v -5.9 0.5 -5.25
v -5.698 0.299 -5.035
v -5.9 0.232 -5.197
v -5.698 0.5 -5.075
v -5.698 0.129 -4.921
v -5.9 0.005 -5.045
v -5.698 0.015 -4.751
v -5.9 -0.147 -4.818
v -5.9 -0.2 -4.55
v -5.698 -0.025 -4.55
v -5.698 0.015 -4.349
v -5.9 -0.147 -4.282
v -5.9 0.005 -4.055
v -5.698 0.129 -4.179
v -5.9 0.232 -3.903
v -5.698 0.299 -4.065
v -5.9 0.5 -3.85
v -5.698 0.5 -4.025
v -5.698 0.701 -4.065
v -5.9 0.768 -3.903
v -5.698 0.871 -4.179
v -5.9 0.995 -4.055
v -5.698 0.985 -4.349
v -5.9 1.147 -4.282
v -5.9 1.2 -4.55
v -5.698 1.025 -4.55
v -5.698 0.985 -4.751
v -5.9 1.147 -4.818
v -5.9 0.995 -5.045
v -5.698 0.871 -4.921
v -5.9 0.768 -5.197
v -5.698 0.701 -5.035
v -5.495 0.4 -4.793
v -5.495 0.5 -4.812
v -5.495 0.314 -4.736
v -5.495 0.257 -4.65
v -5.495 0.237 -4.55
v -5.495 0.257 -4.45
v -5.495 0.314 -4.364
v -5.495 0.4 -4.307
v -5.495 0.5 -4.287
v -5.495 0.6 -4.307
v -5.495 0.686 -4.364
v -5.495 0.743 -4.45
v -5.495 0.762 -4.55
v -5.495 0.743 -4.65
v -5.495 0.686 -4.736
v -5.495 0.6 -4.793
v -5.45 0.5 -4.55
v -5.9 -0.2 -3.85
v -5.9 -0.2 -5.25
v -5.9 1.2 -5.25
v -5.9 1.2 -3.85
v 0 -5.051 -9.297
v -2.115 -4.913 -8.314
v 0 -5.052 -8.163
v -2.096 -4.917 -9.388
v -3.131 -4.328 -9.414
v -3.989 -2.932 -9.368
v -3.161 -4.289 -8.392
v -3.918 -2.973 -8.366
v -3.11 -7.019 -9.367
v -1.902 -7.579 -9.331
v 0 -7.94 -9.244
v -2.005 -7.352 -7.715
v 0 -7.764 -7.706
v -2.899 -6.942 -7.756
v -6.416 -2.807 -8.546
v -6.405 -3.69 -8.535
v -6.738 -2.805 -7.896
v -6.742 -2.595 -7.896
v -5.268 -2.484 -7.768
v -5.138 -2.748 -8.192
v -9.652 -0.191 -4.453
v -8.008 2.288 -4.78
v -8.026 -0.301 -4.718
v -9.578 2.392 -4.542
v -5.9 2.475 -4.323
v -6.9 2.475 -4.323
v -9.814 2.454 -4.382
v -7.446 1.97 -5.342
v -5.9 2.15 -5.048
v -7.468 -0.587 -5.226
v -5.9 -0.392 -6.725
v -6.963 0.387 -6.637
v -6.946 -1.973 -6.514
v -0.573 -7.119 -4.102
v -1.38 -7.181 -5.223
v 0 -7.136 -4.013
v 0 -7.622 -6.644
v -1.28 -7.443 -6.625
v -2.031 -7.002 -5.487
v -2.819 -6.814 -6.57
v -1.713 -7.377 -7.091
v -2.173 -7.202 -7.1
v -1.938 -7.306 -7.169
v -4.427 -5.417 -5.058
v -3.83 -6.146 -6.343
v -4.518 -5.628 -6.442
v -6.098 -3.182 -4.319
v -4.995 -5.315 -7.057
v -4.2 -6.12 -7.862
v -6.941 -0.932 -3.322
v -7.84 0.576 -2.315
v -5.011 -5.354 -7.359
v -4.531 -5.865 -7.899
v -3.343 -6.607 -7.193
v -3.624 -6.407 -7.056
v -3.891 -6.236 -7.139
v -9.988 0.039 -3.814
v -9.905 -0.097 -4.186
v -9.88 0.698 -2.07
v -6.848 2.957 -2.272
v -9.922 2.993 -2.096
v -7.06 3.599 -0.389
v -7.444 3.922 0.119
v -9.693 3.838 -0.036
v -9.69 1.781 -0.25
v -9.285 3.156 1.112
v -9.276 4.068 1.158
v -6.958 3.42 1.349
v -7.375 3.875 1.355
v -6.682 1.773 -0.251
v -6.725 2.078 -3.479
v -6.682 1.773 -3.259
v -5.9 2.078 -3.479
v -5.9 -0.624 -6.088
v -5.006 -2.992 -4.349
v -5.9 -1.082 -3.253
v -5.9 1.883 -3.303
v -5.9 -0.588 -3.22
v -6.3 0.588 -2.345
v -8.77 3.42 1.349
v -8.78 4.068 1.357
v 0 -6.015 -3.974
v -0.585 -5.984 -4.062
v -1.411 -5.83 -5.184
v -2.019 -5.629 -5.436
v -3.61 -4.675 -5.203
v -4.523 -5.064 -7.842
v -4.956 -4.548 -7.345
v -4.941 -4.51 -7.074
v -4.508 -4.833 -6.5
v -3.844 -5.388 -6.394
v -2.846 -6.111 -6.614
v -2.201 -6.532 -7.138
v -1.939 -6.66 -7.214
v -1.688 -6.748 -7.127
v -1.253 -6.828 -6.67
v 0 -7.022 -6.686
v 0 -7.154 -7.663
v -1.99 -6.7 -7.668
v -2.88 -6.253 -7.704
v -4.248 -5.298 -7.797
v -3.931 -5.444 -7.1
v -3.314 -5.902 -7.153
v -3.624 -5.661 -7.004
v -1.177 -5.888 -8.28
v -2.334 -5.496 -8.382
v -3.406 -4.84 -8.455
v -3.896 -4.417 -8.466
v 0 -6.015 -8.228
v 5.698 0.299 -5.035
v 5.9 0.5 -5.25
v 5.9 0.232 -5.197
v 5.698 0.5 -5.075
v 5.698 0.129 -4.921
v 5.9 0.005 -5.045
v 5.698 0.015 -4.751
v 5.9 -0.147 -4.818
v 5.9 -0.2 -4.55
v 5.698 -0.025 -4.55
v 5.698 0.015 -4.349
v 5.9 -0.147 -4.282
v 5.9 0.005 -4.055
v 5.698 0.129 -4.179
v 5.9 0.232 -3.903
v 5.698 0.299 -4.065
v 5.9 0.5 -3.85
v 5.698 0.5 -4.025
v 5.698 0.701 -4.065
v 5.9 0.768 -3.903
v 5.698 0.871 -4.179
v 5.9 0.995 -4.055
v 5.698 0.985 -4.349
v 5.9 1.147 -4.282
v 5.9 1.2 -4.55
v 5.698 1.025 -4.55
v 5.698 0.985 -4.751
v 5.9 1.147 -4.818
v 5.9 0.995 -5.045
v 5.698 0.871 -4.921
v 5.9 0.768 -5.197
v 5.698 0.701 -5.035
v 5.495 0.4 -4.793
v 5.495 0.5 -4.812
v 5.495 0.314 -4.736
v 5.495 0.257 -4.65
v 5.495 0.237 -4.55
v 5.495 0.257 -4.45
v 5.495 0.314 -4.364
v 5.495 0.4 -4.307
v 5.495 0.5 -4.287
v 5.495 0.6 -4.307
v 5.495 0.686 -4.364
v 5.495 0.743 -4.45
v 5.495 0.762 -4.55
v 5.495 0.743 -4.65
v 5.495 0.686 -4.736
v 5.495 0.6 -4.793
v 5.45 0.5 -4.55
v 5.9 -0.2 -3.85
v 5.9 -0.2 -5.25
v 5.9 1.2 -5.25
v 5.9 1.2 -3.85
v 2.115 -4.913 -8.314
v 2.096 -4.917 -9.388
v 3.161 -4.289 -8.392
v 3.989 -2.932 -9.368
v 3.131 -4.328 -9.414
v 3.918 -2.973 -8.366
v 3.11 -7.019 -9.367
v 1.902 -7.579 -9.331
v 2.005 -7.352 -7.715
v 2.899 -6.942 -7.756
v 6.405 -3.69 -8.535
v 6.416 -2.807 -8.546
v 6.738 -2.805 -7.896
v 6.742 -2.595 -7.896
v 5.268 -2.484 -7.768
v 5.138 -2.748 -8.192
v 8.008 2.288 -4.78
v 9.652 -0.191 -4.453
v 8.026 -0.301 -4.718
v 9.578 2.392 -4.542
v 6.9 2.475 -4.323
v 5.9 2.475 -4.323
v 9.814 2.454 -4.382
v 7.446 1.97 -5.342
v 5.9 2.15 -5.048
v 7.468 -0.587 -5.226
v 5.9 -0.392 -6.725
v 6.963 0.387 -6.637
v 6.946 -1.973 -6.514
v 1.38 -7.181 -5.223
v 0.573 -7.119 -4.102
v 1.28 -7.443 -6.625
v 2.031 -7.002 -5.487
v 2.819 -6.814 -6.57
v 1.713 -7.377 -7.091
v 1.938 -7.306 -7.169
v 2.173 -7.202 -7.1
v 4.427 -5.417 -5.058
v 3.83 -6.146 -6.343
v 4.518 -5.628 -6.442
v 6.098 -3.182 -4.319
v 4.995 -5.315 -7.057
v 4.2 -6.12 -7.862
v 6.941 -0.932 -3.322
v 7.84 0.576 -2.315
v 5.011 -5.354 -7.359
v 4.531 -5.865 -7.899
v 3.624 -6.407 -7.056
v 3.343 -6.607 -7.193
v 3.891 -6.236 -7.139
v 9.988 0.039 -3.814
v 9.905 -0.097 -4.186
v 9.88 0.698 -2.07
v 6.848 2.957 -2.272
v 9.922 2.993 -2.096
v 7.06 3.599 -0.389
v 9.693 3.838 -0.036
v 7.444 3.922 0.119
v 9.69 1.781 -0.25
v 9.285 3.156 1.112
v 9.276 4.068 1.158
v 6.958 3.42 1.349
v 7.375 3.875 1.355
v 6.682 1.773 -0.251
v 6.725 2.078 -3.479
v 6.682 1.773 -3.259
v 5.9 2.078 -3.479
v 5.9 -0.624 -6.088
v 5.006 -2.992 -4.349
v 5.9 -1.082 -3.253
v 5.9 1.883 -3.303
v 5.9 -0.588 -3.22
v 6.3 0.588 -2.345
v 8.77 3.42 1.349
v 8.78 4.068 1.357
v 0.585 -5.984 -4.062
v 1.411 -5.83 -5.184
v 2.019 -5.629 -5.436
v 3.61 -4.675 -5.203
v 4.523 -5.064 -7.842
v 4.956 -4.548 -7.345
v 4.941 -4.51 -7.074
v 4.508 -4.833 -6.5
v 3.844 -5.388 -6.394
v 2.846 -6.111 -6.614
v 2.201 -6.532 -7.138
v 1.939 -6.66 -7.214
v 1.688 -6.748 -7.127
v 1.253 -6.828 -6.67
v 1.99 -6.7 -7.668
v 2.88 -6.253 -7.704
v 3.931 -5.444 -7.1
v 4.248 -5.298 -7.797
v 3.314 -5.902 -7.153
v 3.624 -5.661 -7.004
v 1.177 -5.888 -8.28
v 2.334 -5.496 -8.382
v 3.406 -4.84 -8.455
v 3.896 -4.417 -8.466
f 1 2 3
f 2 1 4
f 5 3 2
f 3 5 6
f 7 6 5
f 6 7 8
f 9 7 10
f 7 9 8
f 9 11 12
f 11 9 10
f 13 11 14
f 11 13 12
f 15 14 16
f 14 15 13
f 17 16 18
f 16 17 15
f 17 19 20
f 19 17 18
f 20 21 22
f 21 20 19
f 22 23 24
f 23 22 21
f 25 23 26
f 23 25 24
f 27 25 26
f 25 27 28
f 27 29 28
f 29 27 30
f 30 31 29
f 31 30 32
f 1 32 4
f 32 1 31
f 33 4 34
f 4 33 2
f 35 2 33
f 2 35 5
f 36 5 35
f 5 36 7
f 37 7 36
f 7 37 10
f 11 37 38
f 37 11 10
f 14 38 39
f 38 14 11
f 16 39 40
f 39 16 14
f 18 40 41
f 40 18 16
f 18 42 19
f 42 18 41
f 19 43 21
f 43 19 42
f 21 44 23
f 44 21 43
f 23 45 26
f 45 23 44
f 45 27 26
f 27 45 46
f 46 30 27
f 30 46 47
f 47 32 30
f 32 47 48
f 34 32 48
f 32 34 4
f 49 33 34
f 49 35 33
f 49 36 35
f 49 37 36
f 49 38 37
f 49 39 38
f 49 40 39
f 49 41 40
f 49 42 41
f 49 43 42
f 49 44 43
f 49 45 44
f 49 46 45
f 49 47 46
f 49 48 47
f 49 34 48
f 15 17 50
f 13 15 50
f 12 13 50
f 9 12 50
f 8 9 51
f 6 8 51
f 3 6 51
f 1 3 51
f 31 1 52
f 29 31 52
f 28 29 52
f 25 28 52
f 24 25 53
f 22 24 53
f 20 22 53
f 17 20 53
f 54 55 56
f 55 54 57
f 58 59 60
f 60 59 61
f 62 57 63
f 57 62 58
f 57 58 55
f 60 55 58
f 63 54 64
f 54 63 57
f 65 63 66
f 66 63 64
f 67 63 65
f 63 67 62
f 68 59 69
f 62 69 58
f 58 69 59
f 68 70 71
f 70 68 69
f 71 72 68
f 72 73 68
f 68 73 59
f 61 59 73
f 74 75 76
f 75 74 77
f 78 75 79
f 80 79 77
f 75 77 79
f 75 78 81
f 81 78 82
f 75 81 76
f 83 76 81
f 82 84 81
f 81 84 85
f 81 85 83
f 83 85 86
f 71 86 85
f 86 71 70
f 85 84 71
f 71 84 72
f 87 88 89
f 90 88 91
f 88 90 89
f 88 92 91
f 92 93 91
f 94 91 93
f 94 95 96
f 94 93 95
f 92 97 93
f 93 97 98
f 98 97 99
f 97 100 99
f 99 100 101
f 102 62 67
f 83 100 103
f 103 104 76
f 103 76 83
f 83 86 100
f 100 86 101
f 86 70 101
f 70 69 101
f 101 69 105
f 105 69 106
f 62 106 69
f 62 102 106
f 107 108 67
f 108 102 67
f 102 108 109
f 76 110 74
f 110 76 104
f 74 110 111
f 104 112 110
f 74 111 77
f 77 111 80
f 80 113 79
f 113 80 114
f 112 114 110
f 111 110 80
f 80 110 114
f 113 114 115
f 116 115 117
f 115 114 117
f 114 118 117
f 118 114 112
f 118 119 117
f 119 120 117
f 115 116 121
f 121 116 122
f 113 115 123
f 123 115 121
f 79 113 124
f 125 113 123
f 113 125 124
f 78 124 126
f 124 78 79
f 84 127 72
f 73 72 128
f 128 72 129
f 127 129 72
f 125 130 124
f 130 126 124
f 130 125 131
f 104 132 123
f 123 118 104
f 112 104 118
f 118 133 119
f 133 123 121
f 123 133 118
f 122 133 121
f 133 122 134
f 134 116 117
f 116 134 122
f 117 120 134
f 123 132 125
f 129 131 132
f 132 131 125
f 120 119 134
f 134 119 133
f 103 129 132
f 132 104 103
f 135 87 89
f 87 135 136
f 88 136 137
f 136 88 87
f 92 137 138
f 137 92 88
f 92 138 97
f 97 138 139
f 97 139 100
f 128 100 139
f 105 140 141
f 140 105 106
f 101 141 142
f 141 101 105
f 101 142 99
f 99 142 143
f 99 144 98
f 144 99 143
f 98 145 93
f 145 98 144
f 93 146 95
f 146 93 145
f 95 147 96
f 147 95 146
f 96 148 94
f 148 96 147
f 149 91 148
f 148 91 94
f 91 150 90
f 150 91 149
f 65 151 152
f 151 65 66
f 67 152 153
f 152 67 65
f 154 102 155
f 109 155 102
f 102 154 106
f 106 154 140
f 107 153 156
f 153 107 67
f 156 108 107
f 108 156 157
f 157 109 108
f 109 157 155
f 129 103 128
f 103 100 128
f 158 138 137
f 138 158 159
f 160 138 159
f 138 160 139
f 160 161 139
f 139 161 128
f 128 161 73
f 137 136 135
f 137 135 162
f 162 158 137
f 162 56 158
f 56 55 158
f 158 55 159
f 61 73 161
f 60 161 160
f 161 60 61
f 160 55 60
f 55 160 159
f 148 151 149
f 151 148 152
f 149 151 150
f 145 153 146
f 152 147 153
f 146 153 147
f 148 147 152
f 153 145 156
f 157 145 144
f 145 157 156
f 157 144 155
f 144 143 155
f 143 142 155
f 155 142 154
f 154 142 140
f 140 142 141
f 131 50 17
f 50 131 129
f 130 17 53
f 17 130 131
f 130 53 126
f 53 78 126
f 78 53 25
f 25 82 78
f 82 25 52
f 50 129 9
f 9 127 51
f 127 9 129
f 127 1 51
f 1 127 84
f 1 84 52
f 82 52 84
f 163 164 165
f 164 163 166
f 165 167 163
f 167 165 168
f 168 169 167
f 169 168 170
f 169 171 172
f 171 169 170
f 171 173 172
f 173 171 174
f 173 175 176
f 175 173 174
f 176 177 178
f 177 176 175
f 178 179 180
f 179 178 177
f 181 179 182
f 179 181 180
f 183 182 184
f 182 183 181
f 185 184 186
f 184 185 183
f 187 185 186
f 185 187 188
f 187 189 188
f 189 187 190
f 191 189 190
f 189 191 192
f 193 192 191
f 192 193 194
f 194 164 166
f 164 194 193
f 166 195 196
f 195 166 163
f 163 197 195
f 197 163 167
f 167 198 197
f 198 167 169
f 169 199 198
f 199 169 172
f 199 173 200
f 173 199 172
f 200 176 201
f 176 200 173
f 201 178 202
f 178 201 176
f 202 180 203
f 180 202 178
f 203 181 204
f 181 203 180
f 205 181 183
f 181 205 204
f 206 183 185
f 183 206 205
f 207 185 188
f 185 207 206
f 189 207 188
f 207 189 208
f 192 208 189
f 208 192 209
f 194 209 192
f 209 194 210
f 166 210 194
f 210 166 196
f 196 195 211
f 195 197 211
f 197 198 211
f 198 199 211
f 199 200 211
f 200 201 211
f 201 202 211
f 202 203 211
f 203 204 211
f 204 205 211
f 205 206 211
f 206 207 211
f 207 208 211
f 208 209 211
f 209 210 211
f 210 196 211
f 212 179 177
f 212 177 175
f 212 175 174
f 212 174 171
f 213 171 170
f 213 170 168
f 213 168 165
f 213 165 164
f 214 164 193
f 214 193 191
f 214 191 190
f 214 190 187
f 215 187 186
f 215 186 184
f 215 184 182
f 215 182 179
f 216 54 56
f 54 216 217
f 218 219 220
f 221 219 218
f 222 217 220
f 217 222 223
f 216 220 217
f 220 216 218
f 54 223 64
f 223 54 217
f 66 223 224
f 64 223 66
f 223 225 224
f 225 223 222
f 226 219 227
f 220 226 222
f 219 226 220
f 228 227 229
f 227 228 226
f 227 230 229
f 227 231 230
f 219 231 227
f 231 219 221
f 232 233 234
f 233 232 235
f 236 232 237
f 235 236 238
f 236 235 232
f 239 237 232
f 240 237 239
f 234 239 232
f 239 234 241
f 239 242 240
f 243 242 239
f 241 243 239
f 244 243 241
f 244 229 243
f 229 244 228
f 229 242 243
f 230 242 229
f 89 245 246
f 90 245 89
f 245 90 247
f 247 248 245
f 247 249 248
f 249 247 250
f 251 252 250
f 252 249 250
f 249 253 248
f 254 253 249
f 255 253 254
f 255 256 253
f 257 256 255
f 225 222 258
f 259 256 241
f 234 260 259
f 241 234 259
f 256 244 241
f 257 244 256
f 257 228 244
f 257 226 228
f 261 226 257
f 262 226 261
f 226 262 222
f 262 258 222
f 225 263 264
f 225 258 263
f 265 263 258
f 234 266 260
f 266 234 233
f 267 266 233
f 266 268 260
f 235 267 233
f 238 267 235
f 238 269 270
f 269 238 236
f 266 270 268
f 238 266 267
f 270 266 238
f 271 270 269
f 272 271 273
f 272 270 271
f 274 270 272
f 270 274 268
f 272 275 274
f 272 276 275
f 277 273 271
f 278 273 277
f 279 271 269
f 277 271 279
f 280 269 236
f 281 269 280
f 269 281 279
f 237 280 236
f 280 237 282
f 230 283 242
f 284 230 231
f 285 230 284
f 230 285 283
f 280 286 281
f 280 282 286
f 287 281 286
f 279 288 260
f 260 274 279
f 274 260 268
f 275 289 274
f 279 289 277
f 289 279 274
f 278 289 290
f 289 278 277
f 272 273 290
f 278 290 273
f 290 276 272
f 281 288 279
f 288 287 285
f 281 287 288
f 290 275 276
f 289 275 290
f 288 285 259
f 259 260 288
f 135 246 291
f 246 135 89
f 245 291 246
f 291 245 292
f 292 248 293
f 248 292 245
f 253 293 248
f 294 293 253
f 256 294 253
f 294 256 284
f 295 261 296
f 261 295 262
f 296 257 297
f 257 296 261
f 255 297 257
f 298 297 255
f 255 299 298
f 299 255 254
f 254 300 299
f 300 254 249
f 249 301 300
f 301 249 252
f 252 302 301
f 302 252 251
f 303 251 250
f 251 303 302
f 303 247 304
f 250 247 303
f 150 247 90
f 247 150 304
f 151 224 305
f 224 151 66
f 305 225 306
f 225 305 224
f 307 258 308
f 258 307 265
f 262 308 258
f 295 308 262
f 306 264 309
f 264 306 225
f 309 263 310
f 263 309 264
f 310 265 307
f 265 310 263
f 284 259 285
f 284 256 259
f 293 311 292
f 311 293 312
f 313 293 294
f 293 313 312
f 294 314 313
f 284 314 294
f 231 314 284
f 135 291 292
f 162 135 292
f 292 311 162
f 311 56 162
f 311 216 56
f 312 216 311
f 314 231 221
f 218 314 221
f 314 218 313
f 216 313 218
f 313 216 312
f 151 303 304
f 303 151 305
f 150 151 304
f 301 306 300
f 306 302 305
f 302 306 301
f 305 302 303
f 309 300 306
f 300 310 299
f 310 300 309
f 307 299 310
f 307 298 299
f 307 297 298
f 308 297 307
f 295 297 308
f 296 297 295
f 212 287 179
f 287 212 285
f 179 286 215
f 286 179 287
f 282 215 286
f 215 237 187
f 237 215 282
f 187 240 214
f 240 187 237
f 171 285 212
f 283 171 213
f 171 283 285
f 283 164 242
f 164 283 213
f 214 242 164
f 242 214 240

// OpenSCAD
use <../lib.scad>
use <s/98129s01.scad>
function ldraw_lib__98129() = [
// 0 Minifig Helmet Visor Samurai
// 0 Name: 98129.dat
// 0 Author: Evert-Jan Boer [ejboer]
// 0 !LDRAW_ORG Part UPDATE 2026-02
// 0 !LICENSE Licensed under CC BY 4.0 : see CAreadme.txt
// 
// 0 BFC CERTIFY CCW
  [0,"BFC","CERTIFY"],
  [0,"BFC","CCW"],
// 
// 0 !KEYWORDS Brickowl 341414
// 
// 0 !HISTORY 2013-08-14 {LEGO Digital Designer} Original part shape
// 0 !HISTORY 2024-01-21 [ejboer] File preparation for LDraw Parts Tracker
// 0 !HISTORY 2026-03-06 [OrionP] Official Update 2026-02
// 
// 1 16 0 0 0 1 0 0 0 1 0 0 0 1 s\98129s01.dat
  [1,16,0,0,0,1,0,0,0,1,0,0,0,1, ldraw_lib__s__98129s01()],
// 1 16 0 0 0 -1 0 0 0 1 0 0 0 1 s\98129s01.dat
  [1,16,0,0,0,-1,0,0,0,1,0,0,0,1, ldraw_lib__s__98129s01()],
// 
// 5 24 0 20.571 -15.038 0 20.407 -12.631 -2.943 20.7 -14.721 2.943 20.7 -14.721
  [5,24,0,20.571,-15.038,0,20.407,-12.631,-2.943,20.7,-14.721,2.943,20.7,-14.721],
// 5 24 0 9.934 -15.038 0 20.571 -15.038 3.527 12.959 -14.576 -3.527 12.959 -14.576
  [5,24,0,9.934,-15.038,0,20.571,-15.038,3.527,12.959,-14.576,-3.527,12.959,-14.576],
// 5 24 0 20.407 -12.631 0 23.242 -12.627 5.241 23.469 -12.293 -5.241 23.469 -12.293
  [5,24,0,20.407,-12.631,0,23.242,-12.627,5.241,23.469,-12.293,-5.241,23.469,-12.293],
// 5 24 0 19.158 -17.886 0 16.715 -17.555 -3.133 16.675 -17.069 3.133 16.675 -17.069
  [5,24,0,19.158,-17.886,0,16.715,-17.555,-3.133,16.675,-17.069,3.133,16.675,-17.069],
// 5 24 0 10.032 -17.84 0 9.934 -15.038 -1.463 10.154 -14.961 1.463 10.154 -14.961
  [5,24,0,10.032,-17.84,0,9.934,-15.038,-1.463,10.154,-14.961,1.463,10.154,-14.961],
// 5 24 0 16.61 -19.056 0 10.032 -17.84 3.45 13.058 -17.953 -3.45 13.058 -17.953
  [5,24,0,16.61,-19.056,0,10.032,-17.84,3.45,13.058,-17.953,-3.45,13.058,-17.953],
// 5 24 0 19.264 -19.411 0 19.158 -17.886 4.976 19.17 -16.749 -4.976 19.17 -16.749
  [5,24,0,19.264,-19.411,0,19.158,-17.886,4.976,19.17,-16.749,-4.976,19.17,-16.749],
// 5 24 0 23.242 -12.627 0 23.111 -19.85 4.754 23.328 -18.948 -4.754 23.328 -18.948
  [5,24,0,23.242,-12.627,0,23.111,-19.85,4.754,23.328,-18.948,-4.754,23.328,-18.948],
// 5 24 0 23.111 -19.85 0 19.264 -19.411 -4.754 23.328 -18.948 4.754 23.328 -18.948
  [5,24,0,23.111,-19.85,0,19.264,-19.411,-4.754,23.328,-18.948,4.754,23.328,-18.948],
// 5 24 0 16.715 -17.555 0 16.61 -19.056 -3.201 16.563 -18.607 3.201 16.563 -18.607
  [5,24,0,16.715,-17.555,0,16.61,-19.056,-3.201,16.563,-18.607,3.201,16.563,-18.607],
];
module ldraw_lib__98129(step=0, col=false, unit=2/5, alt=false, line=0.2, solid=!$preview)
    makepoly(ldraw_lib__98129(), step=step, col=col, unit=unit, alt=alt, line=line, solid=solid);
ldraw_lib__98129(line=0.2);
